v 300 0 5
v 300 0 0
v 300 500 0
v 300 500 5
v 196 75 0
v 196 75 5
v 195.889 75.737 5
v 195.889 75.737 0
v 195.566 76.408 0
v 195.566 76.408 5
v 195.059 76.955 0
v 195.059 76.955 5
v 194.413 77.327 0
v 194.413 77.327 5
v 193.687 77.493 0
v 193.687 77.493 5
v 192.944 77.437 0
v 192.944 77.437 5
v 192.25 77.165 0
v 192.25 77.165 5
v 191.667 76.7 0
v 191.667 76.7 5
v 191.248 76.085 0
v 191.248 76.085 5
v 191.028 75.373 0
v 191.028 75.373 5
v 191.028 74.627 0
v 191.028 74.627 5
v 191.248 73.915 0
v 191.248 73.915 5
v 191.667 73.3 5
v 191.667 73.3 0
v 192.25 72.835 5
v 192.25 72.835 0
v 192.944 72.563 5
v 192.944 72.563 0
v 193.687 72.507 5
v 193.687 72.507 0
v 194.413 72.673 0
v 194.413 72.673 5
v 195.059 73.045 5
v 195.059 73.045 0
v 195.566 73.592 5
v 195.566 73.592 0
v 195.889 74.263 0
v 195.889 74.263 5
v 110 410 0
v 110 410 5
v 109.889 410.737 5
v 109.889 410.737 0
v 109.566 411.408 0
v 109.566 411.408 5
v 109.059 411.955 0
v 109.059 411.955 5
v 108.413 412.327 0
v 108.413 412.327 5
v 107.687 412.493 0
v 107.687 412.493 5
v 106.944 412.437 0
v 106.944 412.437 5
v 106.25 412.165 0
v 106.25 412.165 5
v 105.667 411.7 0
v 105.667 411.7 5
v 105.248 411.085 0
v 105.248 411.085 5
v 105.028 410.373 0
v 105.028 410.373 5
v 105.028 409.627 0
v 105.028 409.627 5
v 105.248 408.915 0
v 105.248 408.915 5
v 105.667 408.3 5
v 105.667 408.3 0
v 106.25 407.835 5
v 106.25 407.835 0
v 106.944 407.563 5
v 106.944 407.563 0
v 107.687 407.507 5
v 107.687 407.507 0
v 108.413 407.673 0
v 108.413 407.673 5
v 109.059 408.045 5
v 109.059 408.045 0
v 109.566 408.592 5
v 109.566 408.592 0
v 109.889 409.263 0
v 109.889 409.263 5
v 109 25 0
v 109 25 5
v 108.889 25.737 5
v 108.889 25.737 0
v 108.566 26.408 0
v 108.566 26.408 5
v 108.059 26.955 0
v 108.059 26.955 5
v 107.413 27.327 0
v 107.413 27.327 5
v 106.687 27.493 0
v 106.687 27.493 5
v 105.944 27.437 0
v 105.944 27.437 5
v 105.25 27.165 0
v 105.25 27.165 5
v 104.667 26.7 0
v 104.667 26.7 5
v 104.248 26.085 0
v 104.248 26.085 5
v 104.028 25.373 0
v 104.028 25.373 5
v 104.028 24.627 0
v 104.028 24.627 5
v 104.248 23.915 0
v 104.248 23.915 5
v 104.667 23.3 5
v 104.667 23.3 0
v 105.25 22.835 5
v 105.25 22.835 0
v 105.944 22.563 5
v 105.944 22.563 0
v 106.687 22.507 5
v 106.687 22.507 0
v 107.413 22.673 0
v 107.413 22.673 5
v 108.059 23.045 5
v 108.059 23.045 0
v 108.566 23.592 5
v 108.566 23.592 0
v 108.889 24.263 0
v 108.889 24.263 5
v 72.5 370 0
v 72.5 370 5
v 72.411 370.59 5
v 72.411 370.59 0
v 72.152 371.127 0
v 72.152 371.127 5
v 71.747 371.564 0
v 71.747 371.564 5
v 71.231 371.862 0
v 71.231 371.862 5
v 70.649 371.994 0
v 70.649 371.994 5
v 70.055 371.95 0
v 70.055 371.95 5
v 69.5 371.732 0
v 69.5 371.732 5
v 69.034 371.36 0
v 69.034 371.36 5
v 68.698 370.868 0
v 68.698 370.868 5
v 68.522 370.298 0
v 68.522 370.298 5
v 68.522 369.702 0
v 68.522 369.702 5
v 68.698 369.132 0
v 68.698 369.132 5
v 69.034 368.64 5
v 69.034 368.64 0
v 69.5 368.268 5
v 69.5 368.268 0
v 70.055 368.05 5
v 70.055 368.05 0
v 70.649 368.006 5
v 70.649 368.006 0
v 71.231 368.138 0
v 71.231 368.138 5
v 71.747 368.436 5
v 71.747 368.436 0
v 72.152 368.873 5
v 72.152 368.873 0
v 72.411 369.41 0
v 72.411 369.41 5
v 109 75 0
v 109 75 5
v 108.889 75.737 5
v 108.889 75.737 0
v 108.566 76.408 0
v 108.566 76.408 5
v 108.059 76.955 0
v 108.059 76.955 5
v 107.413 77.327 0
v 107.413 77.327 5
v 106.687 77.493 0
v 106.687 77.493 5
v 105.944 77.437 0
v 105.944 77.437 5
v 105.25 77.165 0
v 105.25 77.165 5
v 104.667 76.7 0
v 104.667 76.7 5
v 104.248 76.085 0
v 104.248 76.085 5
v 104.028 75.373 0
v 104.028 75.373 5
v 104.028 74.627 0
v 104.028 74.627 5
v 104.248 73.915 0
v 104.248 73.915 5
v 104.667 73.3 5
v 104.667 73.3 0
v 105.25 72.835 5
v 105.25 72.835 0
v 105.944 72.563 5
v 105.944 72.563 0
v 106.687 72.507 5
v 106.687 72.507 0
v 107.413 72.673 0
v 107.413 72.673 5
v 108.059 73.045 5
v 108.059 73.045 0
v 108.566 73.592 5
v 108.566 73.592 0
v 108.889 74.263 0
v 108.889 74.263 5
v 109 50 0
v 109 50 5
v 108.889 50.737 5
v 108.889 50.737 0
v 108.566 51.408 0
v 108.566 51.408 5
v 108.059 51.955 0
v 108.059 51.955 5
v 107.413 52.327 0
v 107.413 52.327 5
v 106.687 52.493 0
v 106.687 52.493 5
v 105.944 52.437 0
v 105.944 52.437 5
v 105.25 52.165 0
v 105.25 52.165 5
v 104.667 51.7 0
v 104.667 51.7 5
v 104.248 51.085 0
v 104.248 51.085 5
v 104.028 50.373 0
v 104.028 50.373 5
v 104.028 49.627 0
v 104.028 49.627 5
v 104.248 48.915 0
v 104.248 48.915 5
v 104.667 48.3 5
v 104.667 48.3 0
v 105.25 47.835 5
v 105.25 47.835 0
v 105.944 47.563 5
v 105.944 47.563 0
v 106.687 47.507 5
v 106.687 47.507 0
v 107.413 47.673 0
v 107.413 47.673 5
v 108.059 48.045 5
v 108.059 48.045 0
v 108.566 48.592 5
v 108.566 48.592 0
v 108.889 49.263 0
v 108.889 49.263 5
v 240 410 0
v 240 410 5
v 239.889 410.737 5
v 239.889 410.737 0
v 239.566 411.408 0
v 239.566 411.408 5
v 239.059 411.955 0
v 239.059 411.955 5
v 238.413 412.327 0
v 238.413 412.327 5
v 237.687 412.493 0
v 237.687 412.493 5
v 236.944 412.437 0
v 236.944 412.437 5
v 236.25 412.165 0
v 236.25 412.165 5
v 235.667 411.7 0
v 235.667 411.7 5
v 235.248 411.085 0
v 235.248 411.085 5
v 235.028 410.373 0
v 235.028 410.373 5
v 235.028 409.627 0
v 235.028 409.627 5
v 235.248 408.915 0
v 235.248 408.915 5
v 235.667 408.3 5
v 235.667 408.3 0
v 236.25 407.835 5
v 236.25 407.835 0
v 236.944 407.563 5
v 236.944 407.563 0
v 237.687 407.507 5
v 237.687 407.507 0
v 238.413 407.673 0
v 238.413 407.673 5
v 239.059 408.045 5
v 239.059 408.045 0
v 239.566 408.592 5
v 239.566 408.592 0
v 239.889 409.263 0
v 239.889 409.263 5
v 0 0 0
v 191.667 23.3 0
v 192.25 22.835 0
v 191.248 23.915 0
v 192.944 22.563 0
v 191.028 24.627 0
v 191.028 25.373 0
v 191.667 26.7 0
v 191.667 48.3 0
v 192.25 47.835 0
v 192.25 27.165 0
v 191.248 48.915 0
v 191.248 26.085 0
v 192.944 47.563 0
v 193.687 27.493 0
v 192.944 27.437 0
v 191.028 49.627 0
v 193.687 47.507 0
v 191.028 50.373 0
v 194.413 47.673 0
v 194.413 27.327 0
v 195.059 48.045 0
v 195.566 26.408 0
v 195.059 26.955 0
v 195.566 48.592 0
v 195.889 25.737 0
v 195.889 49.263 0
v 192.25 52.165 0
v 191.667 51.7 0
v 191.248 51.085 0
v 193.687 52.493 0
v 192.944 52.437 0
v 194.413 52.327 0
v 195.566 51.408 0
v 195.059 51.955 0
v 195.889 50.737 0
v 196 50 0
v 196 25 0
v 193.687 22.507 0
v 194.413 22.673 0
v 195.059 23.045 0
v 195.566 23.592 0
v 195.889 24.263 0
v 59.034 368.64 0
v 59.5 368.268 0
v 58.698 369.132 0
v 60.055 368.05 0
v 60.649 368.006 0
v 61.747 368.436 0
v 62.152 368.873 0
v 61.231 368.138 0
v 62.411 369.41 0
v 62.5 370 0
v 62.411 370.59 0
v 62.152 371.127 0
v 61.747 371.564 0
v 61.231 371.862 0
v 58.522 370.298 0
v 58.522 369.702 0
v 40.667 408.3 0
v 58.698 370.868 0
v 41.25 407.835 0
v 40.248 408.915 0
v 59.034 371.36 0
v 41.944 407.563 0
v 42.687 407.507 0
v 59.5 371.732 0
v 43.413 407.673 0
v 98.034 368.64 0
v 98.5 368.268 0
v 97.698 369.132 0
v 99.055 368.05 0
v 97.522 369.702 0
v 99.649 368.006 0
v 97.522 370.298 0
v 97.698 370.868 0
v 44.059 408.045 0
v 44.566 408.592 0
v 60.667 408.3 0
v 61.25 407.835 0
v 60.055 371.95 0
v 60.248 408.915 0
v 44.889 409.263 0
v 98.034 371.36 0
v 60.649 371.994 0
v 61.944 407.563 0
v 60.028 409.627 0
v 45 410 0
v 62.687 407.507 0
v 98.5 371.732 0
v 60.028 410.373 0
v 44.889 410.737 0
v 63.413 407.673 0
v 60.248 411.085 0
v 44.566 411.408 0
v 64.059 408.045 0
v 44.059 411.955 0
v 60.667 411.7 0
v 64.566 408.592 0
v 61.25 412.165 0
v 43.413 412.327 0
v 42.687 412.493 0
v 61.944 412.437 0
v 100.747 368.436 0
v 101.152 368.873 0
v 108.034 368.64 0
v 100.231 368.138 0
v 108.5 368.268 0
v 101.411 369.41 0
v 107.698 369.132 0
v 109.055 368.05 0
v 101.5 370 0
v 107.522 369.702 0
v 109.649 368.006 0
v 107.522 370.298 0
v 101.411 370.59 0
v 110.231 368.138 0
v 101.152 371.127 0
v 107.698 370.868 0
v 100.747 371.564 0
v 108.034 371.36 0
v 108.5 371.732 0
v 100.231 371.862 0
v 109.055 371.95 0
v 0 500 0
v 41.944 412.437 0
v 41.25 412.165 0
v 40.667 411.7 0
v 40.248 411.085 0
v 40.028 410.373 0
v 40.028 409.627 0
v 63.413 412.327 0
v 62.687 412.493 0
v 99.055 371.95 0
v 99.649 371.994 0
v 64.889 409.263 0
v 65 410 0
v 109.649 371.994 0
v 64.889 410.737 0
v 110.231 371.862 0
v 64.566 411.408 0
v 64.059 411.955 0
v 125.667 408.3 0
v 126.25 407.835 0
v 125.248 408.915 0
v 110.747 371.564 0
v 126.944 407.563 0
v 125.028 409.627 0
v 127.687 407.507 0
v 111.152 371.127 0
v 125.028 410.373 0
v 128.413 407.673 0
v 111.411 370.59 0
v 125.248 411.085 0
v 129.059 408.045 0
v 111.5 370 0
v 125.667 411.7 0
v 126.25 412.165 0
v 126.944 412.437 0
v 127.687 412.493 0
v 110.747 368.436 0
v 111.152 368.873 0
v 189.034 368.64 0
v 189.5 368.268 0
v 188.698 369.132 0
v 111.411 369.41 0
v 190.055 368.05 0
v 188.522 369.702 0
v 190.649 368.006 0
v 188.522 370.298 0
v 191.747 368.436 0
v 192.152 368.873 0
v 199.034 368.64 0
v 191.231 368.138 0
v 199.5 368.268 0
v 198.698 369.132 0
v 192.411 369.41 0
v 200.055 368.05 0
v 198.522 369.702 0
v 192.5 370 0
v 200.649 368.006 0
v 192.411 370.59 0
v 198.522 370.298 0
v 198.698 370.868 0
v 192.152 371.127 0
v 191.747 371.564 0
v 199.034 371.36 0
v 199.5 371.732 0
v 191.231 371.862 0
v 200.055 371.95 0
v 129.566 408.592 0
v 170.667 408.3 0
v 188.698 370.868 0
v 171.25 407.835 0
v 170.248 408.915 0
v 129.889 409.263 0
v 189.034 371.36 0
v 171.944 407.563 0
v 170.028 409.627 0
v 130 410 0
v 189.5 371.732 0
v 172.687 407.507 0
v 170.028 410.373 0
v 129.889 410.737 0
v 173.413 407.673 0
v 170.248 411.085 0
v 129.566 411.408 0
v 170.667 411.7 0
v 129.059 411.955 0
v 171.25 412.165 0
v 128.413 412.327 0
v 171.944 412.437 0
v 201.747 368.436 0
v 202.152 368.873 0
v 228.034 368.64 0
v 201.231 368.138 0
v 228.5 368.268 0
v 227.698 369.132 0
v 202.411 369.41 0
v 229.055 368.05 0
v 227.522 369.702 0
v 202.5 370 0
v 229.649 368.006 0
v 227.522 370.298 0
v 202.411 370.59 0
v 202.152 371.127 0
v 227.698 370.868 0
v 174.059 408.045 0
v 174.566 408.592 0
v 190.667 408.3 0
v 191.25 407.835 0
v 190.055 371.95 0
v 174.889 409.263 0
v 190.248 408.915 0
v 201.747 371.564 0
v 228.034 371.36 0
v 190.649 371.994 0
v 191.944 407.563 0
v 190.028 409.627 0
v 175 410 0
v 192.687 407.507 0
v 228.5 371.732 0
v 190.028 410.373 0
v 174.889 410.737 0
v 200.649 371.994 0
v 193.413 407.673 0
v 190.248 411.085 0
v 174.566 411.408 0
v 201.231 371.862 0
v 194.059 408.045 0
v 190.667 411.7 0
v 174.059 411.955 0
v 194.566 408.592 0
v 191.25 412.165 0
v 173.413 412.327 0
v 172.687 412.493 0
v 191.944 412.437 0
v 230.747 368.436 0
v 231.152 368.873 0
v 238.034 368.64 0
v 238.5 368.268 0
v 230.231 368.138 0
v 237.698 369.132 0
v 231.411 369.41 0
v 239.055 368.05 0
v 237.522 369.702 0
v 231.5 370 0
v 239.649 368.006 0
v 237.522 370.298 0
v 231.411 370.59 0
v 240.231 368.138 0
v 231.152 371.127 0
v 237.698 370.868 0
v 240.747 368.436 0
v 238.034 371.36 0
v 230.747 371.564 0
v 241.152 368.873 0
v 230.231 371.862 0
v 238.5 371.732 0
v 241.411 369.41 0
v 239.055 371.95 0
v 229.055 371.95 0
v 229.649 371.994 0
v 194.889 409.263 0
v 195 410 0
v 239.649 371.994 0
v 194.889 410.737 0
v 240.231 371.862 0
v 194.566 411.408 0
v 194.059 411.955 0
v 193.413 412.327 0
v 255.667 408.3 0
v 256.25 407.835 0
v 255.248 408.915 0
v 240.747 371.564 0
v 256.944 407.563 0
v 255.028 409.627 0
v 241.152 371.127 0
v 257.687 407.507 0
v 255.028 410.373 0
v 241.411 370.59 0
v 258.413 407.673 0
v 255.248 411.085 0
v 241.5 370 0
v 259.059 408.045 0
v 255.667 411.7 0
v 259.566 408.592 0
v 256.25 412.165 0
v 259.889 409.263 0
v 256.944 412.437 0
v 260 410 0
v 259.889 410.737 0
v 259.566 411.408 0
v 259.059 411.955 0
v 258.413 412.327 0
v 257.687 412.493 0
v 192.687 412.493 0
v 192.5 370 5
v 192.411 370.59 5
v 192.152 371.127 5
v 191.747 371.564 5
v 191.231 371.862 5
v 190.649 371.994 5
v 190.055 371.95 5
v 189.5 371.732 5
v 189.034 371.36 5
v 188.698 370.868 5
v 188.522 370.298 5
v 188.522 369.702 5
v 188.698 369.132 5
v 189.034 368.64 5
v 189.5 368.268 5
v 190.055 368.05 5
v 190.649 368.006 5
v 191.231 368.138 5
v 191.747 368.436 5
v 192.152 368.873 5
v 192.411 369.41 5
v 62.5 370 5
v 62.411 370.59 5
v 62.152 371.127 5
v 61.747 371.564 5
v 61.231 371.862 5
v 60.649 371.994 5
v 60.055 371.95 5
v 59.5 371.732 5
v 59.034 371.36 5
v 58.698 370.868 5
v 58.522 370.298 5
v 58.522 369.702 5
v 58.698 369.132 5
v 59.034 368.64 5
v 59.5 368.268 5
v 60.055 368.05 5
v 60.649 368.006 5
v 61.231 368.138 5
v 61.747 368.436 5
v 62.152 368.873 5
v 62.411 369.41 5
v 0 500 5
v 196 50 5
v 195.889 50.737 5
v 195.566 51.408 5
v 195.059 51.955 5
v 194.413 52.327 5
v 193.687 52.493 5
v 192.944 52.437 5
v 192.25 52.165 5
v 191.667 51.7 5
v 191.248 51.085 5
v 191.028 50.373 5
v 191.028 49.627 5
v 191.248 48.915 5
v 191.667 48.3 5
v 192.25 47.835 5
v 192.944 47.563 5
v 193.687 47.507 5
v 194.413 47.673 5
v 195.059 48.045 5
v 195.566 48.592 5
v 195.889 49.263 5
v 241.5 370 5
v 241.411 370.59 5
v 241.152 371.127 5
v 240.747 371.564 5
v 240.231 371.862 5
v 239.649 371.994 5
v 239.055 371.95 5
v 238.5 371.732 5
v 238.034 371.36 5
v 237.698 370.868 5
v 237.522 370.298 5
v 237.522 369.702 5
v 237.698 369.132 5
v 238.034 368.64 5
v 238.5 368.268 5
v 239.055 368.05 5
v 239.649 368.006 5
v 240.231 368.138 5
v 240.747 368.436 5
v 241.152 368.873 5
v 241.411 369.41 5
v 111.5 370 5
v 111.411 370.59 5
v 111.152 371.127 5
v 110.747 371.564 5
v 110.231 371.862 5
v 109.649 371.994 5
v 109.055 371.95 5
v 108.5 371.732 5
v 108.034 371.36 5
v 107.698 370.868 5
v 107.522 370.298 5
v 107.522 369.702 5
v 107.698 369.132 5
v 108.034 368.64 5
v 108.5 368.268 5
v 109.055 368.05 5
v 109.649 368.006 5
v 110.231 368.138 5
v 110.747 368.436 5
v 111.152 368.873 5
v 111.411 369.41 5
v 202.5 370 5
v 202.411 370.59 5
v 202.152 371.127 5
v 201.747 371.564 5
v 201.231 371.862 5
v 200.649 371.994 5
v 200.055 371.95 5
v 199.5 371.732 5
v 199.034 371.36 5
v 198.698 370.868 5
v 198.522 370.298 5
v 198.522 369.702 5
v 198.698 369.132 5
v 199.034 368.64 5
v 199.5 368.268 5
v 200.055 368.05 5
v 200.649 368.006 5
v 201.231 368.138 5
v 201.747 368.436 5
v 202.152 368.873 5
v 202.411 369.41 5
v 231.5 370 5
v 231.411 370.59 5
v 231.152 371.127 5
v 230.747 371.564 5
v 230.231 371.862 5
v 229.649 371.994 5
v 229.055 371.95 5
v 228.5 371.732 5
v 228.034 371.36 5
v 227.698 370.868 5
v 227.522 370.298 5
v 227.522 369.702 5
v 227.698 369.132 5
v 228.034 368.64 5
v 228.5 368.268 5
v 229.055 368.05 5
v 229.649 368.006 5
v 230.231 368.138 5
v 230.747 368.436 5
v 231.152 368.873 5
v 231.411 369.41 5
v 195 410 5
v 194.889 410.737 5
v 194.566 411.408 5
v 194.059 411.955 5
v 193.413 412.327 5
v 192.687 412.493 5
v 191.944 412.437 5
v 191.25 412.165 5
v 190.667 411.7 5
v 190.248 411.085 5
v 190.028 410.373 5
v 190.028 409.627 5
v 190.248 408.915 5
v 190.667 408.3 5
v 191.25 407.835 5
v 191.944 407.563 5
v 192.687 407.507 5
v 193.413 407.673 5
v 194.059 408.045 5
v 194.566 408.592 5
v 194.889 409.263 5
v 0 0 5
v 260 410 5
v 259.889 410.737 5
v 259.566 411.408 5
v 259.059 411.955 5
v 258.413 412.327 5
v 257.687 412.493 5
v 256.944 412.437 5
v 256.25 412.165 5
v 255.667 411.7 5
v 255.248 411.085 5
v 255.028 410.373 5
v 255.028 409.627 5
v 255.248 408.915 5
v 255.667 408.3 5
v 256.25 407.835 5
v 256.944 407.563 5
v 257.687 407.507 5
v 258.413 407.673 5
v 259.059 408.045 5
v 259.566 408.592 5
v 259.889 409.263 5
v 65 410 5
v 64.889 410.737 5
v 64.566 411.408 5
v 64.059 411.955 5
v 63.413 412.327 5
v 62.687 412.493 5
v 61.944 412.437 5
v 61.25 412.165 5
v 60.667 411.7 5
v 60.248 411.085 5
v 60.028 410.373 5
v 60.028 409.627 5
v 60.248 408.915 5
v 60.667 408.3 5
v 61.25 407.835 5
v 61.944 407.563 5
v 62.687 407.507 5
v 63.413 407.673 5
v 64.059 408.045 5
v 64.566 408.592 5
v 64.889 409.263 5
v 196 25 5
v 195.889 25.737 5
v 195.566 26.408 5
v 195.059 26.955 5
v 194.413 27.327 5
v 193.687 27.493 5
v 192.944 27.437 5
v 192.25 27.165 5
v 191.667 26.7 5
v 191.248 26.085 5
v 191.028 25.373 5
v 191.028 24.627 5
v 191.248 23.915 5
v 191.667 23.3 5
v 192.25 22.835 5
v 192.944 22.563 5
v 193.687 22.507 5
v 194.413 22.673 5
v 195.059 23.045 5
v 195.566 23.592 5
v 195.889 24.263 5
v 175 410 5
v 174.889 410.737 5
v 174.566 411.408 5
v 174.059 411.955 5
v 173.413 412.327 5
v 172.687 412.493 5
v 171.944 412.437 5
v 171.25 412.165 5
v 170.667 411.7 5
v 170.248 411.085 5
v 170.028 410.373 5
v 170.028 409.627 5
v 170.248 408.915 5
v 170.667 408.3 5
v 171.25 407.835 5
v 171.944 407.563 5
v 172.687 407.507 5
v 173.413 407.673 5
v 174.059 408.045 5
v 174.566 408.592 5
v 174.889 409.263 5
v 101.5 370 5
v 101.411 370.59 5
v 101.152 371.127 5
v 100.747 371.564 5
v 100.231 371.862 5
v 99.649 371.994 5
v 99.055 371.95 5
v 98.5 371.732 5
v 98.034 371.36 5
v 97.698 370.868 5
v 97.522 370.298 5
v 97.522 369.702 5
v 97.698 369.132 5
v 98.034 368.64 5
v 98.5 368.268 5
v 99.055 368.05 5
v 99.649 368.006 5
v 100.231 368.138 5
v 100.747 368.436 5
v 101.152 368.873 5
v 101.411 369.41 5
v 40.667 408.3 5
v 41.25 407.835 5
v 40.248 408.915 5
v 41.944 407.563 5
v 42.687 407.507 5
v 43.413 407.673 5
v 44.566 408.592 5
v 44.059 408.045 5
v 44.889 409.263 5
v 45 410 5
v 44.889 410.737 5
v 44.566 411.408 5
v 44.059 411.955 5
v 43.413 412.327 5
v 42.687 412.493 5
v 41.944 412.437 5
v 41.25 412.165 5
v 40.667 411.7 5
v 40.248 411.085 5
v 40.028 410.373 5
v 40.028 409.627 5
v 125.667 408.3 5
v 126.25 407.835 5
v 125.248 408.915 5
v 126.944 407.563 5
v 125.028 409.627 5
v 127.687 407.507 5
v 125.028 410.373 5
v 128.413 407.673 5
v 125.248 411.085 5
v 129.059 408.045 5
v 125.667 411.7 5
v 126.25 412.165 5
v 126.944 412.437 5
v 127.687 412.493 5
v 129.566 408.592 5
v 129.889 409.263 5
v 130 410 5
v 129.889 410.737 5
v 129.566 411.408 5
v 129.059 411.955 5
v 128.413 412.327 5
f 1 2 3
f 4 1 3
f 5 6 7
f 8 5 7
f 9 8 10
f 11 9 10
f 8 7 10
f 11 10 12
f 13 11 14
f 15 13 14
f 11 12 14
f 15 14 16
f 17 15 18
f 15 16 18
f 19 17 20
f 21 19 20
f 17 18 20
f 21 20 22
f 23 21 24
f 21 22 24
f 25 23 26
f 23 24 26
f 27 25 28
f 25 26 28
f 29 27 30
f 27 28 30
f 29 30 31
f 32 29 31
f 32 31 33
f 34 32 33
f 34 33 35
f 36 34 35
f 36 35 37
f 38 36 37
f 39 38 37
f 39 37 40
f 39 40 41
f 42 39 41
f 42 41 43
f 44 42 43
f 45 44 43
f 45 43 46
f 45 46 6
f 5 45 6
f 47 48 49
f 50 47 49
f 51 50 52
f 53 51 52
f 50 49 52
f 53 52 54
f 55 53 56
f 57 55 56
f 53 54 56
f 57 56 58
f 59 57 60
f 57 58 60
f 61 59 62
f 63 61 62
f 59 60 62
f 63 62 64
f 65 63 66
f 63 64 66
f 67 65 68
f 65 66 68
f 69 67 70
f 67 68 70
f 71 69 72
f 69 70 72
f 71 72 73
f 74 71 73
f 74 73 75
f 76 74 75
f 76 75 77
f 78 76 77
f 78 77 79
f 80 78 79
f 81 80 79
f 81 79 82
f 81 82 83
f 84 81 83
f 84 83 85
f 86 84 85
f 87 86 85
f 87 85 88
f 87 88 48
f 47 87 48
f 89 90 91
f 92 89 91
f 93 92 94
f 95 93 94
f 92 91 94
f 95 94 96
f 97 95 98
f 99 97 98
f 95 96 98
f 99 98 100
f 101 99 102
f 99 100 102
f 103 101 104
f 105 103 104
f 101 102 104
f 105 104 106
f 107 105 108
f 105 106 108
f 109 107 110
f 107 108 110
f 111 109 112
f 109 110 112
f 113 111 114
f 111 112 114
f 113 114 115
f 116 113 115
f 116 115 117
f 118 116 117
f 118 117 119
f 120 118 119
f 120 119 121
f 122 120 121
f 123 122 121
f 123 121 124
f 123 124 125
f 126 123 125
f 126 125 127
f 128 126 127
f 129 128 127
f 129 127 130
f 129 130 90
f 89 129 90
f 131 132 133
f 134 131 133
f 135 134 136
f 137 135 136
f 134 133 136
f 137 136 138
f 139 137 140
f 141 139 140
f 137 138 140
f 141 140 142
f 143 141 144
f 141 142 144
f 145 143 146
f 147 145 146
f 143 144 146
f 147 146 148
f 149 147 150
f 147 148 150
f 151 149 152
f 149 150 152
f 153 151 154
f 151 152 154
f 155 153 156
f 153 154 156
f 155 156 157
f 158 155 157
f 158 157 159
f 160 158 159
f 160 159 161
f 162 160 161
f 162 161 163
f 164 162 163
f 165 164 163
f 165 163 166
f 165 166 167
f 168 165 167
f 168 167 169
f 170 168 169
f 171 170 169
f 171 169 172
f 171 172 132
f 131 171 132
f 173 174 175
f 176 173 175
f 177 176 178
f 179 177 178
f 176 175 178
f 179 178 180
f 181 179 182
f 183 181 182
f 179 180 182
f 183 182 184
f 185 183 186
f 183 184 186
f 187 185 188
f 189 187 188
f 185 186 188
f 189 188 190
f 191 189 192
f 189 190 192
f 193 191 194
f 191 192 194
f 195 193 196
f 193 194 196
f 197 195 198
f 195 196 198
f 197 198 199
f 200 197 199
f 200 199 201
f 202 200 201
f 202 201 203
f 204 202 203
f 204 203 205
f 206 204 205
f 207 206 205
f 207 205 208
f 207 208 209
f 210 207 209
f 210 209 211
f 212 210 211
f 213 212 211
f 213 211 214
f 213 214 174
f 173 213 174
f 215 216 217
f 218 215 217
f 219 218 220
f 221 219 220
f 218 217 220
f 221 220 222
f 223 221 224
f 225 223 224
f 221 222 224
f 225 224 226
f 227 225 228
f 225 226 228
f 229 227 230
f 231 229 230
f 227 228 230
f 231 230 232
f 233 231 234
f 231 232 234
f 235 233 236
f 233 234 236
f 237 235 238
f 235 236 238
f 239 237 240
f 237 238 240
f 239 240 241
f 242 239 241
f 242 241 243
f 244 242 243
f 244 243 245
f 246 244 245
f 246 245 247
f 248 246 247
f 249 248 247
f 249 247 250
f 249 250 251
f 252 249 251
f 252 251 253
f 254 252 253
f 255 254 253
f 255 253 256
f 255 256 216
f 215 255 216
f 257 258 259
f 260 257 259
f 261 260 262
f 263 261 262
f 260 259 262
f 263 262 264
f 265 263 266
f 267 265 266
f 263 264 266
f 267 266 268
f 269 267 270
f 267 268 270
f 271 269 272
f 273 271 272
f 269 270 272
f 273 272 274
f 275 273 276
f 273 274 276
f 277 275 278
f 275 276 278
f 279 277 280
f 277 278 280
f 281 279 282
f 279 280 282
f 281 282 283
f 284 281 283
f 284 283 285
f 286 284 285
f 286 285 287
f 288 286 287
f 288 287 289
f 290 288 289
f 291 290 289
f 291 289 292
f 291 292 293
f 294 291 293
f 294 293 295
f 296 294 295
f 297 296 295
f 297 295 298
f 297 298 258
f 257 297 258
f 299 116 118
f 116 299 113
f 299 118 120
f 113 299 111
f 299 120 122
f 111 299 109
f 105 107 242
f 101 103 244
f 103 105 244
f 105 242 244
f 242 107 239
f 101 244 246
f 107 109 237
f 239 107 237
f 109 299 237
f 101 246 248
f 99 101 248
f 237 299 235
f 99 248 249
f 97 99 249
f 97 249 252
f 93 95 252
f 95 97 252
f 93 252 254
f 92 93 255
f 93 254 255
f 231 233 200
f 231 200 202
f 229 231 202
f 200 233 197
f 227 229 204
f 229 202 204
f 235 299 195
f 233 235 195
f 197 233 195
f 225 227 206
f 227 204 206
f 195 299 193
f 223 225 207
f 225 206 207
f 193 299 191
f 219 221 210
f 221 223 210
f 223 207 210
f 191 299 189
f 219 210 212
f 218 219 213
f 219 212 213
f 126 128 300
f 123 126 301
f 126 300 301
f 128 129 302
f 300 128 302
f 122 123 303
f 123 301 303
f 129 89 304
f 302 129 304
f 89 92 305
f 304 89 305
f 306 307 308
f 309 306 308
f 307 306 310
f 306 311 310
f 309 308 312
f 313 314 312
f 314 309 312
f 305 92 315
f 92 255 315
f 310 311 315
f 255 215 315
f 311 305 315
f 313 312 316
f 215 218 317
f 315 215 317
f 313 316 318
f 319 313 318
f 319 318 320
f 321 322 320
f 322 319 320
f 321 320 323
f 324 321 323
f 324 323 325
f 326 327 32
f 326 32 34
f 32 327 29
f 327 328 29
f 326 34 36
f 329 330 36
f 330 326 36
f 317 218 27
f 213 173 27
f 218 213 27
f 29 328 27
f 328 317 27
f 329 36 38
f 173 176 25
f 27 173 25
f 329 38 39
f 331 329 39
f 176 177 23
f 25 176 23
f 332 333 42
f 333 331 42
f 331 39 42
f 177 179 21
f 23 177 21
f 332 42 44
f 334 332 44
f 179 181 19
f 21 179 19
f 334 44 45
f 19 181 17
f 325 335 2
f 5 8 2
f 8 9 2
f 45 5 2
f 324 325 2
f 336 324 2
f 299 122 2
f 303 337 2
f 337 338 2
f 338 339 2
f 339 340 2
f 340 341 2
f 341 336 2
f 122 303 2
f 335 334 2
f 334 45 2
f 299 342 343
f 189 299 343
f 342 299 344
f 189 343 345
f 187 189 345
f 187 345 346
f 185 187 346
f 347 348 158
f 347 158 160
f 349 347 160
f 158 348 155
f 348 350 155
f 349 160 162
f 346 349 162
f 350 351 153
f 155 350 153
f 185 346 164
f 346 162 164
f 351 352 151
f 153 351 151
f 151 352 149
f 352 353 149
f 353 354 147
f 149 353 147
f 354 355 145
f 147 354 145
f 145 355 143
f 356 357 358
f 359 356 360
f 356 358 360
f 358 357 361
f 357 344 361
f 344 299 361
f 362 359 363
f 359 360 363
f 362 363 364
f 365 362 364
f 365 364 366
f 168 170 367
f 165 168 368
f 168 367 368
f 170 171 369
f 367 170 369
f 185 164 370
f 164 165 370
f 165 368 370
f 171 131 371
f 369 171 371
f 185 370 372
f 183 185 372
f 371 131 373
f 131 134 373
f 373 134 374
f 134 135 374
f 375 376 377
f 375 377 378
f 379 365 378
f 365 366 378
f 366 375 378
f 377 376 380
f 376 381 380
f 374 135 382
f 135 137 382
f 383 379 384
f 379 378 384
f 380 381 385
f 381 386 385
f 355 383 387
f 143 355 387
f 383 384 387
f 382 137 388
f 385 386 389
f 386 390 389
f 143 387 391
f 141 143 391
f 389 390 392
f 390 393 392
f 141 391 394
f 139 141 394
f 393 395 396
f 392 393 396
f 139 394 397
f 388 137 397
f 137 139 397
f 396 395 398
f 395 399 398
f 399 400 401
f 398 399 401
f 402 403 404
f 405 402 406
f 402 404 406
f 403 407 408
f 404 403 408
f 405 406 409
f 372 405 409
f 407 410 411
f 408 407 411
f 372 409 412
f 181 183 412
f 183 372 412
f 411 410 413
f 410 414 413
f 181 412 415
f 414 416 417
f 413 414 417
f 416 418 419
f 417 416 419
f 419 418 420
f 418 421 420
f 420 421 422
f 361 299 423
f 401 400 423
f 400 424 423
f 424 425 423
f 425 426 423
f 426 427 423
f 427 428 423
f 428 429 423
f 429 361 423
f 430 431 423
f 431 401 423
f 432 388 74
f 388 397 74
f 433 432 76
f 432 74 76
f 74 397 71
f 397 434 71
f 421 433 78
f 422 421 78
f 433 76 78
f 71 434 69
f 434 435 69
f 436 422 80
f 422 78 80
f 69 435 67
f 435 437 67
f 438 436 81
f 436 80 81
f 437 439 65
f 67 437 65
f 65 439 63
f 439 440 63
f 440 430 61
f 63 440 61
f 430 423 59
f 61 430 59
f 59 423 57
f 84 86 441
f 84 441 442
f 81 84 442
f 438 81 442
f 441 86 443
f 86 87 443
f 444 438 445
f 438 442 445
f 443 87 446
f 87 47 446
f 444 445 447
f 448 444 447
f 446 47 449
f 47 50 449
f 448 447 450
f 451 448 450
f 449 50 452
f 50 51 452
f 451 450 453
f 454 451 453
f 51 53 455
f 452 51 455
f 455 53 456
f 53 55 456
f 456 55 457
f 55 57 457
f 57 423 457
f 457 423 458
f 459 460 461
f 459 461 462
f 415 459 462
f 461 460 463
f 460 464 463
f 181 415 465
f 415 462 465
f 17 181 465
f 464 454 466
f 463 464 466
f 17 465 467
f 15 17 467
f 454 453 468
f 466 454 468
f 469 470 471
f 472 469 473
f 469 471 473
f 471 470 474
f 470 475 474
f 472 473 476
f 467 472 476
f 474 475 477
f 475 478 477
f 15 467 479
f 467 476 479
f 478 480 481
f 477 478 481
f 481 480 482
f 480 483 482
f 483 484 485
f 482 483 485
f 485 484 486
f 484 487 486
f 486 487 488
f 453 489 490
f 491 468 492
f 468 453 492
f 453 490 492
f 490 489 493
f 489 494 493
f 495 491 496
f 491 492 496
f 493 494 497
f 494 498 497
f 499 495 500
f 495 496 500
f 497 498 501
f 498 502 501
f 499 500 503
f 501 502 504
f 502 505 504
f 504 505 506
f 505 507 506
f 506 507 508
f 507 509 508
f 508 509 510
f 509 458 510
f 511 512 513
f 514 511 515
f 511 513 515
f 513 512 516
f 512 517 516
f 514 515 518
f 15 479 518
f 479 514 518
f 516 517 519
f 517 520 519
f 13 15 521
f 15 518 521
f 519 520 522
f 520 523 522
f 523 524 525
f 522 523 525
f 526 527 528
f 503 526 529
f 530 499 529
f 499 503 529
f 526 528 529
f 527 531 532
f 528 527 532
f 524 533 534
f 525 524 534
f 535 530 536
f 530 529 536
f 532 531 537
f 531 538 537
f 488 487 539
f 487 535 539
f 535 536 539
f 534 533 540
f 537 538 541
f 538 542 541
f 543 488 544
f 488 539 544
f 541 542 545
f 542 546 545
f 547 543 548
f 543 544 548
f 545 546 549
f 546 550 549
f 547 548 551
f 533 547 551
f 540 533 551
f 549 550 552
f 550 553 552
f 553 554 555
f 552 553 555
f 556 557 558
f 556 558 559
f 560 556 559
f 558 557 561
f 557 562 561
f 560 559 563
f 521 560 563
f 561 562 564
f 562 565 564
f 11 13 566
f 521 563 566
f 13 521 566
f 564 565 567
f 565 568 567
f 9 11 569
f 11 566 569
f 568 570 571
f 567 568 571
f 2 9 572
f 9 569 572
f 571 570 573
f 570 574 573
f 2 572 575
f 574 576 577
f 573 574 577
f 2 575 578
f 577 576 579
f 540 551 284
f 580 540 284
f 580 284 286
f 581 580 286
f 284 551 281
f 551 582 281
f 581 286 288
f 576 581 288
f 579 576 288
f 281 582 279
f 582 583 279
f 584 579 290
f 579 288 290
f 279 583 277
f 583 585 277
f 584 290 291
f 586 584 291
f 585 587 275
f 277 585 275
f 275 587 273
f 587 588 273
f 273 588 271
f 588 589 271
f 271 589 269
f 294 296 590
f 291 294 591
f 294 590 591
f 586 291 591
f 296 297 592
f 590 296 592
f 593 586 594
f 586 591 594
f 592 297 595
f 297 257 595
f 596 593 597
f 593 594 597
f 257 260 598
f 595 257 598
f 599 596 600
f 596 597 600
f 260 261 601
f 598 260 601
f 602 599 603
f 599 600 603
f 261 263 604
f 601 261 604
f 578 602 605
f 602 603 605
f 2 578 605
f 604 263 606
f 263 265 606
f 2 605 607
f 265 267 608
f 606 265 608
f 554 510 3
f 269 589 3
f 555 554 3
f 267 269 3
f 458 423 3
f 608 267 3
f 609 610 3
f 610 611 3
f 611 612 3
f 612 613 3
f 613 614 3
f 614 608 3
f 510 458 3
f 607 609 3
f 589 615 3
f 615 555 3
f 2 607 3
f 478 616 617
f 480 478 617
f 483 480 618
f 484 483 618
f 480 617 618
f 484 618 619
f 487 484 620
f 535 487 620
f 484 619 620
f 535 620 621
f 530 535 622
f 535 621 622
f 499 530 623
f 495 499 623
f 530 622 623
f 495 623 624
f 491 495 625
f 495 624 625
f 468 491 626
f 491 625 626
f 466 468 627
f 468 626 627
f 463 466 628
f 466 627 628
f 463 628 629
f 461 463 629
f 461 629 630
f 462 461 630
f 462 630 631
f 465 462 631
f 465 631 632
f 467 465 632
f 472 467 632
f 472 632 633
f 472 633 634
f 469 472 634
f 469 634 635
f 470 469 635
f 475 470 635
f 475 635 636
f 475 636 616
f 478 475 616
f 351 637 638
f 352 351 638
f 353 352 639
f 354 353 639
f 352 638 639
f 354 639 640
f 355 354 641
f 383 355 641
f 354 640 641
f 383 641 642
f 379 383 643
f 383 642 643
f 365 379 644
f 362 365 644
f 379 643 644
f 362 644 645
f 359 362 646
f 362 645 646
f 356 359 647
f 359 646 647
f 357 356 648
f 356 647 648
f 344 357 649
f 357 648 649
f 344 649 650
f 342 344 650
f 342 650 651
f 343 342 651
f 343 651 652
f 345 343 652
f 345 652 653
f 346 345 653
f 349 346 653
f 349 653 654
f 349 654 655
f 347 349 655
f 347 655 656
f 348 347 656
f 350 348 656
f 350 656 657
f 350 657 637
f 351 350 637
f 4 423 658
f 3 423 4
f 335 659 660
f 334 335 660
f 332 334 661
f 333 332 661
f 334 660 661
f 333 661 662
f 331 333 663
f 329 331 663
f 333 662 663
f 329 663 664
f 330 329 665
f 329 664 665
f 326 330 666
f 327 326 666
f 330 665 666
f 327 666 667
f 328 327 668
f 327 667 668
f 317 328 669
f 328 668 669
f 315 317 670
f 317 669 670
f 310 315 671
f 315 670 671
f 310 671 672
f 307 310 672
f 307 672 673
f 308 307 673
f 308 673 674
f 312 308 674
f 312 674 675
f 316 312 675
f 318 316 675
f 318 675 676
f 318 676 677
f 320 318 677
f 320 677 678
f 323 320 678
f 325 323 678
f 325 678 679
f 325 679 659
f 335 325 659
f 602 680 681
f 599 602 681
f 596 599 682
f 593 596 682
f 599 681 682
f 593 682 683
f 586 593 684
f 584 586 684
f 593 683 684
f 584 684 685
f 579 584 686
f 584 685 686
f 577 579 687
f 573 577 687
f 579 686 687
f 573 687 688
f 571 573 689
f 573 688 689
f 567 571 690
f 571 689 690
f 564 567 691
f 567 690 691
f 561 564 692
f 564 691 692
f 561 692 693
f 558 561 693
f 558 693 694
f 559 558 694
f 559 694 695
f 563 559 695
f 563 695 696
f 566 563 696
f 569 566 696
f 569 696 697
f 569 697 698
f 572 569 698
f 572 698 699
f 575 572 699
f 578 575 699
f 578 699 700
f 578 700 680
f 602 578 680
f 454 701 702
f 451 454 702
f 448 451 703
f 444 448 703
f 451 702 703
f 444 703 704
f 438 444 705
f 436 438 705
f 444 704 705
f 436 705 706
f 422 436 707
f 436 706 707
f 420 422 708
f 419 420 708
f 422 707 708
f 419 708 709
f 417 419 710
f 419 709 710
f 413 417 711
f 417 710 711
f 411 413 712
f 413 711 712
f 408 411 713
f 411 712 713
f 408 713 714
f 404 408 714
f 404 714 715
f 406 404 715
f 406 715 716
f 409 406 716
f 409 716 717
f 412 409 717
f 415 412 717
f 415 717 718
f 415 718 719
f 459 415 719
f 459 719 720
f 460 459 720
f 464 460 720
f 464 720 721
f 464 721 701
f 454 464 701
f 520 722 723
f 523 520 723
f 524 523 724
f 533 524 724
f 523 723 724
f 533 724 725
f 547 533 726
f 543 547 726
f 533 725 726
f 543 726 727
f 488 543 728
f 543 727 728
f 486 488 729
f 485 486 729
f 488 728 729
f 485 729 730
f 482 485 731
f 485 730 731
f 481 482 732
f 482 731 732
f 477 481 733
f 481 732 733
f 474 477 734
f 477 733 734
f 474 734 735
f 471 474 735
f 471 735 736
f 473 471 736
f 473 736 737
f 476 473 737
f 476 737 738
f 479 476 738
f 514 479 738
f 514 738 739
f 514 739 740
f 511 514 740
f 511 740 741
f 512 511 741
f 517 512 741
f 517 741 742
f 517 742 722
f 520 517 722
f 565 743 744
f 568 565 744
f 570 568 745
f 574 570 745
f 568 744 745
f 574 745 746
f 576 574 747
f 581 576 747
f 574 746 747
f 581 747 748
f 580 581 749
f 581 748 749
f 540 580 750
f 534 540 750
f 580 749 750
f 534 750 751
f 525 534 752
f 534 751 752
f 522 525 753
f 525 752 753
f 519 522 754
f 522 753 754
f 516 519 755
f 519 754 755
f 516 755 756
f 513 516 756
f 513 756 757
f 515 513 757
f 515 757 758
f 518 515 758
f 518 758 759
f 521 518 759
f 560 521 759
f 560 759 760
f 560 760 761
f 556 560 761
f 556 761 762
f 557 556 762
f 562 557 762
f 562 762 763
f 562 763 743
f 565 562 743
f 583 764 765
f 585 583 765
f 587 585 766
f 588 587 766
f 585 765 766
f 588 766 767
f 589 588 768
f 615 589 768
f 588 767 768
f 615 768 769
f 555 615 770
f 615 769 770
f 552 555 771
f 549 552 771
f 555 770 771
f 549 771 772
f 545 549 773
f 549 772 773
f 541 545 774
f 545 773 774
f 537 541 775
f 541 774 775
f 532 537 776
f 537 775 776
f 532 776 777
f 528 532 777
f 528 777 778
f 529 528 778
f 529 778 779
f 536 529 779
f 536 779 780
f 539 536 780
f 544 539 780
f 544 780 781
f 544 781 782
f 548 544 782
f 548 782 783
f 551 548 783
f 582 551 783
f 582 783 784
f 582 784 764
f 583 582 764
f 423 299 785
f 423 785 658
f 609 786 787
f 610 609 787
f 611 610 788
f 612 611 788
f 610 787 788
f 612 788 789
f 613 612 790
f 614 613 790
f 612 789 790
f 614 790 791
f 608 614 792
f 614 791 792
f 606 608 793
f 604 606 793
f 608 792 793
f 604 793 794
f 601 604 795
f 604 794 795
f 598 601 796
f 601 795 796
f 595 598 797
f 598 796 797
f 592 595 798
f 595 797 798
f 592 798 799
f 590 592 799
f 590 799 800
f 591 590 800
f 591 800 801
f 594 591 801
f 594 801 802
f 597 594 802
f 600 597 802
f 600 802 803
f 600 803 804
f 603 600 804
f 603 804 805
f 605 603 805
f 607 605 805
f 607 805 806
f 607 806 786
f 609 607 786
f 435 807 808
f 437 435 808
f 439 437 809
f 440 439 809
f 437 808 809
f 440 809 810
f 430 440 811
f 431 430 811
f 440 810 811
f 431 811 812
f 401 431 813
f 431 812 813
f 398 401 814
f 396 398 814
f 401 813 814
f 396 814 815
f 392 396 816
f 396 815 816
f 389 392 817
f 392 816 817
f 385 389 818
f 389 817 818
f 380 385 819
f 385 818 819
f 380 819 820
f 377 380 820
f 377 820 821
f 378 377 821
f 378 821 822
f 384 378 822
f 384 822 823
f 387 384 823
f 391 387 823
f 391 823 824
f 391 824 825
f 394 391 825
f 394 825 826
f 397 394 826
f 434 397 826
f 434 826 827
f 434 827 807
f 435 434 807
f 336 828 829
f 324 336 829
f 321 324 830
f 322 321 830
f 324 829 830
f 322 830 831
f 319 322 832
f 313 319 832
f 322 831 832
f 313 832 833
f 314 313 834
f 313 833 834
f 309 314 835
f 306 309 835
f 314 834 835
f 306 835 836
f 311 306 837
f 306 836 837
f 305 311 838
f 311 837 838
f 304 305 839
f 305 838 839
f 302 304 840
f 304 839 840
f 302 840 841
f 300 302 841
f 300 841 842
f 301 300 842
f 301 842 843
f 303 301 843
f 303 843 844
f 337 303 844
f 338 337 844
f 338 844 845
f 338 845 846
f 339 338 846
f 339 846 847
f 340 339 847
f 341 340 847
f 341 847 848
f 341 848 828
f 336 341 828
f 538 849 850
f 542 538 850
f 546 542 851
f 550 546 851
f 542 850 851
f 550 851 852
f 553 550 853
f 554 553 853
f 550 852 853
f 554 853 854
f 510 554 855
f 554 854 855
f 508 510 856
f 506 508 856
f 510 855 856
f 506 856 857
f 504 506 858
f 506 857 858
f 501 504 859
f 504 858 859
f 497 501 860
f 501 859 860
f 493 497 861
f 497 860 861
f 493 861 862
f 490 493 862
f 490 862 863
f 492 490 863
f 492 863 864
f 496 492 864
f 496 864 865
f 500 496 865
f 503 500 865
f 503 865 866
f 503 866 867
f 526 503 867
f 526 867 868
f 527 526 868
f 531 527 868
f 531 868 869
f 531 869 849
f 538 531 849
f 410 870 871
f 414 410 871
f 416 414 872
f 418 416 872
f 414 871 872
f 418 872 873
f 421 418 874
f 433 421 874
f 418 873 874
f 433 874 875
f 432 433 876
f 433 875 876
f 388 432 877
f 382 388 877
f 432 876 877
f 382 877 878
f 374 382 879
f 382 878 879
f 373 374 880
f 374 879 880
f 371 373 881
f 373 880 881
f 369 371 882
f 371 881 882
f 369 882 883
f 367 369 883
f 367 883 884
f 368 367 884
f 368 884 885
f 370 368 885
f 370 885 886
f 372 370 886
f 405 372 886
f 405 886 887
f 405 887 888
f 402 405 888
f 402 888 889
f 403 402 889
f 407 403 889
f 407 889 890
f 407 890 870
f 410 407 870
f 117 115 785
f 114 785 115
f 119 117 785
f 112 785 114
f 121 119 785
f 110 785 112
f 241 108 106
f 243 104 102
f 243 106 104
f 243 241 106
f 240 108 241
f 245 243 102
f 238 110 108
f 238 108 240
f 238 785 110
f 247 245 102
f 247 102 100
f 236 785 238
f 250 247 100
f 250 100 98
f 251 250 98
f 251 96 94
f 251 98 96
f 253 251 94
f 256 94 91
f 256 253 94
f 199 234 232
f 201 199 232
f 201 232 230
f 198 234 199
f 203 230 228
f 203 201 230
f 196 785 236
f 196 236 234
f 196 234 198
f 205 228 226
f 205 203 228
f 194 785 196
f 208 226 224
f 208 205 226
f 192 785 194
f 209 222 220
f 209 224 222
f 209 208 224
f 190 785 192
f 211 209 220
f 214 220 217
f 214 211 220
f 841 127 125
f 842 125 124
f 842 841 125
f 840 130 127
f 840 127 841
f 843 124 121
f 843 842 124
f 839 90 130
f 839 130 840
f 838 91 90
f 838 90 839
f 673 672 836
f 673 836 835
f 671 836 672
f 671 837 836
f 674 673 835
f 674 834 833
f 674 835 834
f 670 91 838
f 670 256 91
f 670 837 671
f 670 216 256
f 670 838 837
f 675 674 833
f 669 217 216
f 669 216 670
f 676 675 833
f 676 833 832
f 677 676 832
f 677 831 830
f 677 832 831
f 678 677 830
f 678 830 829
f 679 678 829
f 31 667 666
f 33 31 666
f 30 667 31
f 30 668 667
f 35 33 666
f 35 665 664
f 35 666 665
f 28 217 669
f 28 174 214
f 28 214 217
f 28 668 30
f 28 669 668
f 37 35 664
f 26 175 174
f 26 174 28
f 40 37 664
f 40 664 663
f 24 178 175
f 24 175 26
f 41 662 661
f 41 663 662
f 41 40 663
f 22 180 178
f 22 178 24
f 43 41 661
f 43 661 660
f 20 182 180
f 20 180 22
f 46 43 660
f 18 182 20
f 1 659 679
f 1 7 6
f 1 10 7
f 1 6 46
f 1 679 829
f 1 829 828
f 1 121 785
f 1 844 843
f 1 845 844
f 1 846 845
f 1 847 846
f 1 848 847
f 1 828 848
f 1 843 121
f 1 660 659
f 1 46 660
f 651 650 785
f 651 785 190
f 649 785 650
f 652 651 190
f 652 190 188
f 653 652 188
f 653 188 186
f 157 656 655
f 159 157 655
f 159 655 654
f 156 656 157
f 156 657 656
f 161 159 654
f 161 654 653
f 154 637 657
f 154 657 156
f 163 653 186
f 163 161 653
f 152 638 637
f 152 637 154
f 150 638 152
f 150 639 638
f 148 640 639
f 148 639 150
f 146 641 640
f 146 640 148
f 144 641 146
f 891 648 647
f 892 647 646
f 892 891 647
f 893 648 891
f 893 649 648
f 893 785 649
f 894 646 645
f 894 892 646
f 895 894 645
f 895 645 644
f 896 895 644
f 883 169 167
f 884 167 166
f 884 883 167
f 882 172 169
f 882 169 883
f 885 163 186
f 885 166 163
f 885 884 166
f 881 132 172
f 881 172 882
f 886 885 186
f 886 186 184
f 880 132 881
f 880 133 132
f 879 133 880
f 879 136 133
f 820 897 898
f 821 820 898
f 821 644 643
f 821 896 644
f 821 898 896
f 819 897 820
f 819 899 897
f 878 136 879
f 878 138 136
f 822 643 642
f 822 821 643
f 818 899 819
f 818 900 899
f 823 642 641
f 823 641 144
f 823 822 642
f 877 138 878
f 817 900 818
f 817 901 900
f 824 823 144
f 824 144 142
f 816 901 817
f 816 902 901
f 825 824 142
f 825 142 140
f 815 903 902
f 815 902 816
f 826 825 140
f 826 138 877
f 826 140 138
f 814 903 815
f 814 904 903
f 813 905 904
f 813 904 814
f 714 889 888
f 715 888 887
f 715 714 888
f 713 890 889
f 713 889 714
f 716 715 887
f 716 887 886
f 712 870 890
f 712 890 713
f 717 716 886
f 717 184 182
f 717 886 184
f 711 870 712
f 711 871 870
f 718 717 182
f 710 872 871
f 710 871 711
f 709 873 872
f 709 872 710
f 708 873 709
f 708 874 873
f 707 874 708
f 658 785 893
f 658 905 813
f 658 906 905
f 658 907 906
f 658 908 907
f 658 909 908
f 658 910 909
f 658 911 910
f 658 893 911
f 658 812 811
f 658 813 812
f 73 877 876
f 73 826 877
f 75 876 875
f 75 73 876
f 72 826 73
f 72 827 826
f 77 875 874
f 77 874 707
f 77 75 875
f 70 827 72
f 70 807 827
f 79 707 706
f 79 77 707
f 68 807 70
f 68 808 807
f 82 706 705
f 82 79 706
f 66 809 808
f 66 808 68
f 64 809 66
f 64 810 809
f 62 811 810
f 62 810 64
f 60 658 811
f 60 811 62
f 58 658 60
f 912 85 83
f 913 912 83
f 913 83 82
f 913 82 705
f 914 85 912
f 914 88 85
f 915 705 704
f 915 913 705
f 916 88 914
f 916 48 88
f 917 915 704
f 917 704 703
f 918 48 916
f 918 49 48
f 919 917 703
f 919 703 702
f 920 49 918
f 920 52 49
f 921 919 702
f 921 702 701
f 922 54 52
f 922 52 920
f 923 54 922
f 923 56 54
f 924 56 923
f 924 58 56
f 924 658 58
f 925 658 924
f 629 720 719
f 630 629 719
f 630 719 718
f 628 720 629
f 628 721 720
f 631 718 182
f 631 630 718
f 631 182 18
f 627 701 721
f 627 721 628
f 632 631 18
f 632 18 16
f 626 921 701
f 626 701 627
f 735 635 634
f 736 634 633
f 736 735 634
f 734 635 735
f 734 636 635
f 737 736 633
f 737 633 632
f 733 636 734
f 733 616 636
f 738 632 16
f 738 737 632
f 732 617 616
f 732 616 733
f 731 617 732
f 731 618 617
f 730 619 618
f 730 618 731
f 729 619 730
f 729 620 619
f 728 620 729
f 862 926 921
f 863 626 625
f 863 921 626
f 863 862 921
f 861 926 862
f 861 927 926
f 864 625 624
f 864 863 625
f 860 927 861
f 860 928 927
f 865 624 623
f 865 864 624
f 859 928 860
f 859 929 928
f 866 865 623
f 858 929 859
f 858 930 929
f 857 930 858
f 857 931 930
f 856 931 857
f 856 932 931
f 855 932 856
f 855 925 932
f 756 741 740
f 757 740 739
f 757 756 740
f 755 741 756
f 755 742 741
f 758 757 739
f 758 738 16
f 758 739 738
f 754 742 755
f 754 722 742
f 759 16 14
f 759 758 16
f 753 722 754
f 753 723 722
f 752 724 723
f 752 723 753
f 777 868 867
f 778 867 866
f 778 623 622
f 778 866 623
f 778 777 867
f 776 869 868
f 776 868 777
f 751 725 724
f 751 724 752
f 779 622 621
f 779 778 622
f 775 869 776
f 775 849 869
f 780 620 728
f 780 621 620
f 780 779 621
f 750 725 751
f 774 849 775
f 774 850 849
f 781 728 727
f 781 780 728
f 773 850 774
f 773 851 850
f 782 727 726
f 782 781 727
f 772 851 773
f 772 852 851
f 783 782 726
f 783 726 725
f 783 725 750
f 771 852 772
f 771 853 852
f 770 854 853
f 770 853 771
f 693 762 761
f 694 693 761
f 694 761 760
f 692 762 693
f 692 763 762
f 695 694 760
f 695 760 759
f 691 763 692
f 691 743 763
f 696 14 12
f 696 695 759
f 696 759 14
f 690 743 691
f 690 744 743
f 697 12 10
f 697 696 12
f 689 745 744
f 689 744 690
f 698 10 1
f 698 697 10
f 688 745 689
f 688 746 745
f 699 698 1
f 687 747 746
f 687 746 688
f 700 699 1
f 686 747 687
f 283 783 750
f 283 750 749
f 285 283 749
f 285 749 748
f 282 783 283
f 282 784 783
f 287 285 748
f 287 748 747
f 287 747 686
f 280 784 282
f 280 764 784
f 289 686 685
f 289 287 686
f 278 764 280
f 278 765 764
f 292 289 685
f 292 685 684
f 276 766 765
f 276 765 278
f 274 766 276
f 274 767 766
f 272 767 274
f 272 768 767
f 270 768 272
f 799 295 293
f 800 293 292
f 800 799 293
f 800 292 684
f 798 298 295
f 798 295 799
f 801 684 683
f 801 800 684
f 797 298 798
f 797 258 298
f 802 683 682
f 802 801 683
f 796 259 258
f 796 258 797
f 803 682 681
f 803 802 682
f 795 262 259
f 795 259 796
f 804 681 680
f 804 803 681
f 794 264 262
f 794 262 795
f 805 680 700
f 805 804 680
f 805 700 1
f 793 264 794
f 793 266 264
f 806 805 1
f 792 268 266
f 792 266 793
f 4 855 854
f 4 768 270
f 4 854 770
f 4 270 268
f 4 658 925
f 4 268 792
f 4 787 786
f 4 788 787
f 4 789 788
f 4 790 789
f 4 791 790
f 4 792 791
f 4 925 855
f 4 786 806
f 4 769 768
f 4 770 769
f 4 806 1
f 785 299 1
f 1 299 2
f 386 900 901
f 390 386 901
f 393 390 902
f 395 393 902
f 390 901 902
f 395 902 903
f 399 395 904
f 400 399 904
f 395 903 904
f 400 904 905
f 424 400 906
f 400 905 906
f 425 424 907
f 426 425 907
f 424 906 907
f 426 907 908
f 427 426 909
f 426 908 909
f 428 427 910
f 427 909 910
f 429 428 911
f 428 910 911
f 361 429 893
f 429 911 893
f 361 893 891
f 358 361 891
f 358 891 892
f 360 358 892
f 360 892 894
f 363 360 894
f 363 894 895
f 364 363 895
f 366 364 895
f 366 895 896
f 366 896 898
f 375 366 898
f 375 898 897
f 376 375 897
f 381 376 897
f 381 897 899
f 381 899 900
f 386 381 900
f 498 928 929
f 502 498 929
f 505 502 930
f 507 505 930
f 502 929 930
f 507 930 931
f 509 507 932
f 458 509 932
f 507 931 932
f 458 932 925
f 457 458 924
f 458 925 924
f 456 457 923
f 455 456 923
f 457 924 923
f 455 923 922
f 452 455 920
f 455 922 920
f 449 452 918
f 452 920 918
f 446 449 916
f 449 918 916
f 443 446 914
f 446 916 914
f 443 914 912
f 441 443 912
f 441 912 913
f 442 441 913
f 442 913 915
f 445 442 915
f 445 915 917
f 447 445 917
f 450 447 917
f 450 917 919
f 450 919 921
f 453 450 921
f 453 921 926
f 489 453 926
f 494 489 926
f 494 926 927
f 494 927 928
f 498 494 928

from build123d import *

# Parameters (mm, degrees)
SKETCH1_W           = 300
SKETCH1_H           = 500
BOSS_EXTRUDE1_DEPTH = 5
SKETCH2_R           = 2.5
SKETCH2_R_2         = 2
CUT_EXTRUDE1_DEPTH  = 10
SKETCH3_R           = 2.5
CUT_EXTRUDE2_DEPTH  = 10


with BuildPart() as part:
    # Sketch1 → Boss-Extrude1 (new body)
    with BuildSketch(Plane.XY):
        with Locations((150, 250)):
            Rectangle(SKETCH1_W, SKETCH1_H)
    extrude(amount=BOSS_EXTRUDE1_DEPTH)

    # Sketch2 → Cut-Extrude1 (cut)
    with BuildSketch(Plane.XY.offset(5)):
        with Locations((42.5, 410)):
            Circle(SKETCH2_R)
        with Locations((62.5, 410)):
            Circle(SKETCH2_R)
        with Locations((107.5, 410)):
            Circle(SKETCH2_R)
        with Locations((127.5, 410)):
            Circle(SKETCH2_R)
        with Locations((172.5, 410)):
            Circle(SKETCH2_R)
        with Locations((192.5, 410)):
            Circle(SKETCH2_R)
        with Locations((237.5, 410)):
            Circle(SKETCH2_R)
        with Locations((70.5, 370)):
            Circle(SKETCH2_R_2)
        with Locations((99.5, 370)):
            Circle(SKETCH2_R_2)
        with Locations((200.5, 370)):
            Circle(SKETCH2_R_2)
        with Locations((257.5, 410)):
            Circle(SKETCH2_R)
        with Locations((229.5, 370)):
            Circle(SKETCH2_R_2)
        with Locations((60.5, 370)):
            Circle(SKETCH2_R_2)
        with Locations((109.5, 370)):
            Circle(SKETCH2_R_2)
        with Locations((190.5, 370)):
            Circle(SKETCH2_R_2)
        with Locations((239.5, 370)):
            Circle(SKETCH2_R_2)
    extrude(amount=-CUT_EXTRUDE1_DEPTH, mode=Mode.SUBTRACT)

    # Sketch3 → Cut-Extrude2 (cut)
    with BuildSketch(Plane.XY.offset(5)):
        with Locations((106.5, 25)):
            Circle(SKETCH3_R)
        with Locations((106.5, 50)):
            Circle(SKETCH3_R)
        with Locations((106.5, 75)):
            Circle(SKETCH3_R)
        with Locations((193.5, 25)):
            Circle(SKETCH3_R)
        with Locations((193.5, 50)):
            Circle(SKETCH3_R)
        with Locations((193.5, 75)):
            Circle(SKETCH3_R)
    extrude(amount=-CUT_EXTRUDE2_DEPTH, mode=Mode.SUBTRACT)


solid = part.part
